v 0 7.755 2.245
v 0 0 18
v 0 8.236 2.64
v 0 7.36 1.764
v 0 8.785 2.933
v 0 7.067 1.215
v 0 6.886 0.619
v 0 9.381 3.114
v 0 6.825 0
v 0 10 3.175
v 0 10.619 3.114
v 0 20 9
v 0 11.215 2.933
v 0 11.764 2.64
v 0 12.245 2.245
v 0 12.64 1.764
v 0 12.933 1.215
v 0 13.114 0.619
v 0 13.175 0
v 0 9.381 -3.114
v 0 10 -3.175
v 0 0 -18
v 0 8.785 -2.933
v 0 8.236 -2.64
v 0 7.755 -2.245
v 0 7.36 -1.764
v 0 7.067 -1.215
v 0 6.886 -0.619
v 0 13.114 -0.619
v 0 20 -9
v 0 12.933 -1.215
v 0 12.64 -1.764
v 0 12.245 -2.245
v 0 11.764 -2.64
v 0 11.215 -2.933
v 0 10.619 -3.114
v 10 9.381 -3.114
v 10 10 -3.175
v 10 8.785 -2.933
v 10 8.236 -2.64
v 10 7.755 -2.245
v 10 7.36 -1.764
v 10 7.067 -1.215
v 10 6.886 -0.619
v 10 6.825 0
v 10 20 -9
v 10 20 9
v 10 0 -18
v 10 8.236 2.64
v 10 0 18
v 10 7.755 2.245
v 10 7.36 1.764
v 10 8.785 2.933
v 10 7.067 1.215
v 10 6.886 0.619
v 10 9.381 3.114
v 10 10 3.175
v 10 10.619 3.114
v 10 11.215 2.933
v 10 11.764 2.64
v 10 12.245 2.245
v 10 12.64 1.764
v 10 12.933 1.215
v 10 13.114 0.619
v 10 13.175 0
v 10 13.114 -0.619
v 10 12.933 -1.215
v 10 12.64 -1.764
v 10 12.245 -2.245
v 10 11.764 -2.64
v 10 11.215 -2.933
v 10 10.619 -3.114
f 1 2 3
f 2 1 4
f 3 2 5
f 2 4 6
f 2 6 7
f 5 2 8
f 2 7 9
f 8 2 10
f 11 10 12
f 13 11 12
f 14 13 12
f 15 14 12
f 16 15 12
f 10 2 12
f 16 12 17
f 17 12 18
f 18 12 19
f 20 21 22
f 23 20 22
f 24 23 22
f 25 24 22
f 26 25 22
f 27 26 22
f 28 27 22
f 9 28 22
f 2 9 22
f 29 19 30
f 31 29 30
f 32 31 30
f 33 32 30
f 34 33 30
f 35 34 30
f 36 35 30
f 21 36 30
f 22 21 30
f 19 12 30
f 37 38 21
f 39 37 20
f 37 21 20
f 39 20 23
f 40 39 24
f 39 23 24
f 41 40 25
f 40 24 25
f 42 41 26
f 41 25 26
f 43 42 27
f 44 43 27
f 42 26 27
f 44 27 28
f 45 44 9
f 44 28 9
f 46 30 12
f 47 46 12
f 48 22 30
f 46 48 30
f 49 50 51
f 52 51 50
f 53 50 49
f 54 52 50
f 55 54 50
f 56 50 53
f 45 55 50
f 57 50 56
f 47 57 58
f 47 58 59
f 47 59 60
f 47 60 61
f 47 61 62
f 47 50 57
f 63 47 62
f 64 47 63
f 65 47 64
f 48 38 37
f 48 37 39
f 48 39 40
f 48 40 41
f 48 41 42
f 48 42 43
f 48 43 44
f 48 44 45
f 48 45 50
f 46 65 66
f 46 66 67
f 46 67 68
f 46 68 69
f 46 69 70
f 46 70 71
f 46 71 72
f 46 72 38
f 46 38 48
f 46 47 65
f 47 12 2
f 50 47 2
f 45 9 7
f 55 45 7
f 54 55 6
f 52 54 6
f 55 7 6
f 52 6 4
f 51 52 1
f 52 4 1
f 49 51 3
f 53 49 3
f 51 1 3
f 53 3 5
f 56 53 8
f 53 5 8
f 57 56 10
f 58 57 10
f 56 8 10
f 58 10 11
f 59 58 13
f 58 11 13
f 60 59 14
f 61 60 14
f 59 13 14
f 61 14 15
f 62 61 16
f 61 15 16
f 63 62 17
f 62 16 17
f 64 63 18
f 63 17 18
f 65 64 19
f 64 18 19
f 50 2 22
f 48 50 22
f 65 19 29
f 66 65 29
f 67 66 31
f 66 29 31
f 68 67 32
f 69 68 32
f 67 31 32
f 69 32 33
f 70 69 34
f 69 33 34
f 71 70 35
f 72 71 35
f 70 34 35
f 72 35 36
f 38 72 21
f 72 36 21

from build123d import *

# Parameters (mm, degrees)
BOSS_EXTRUDE1_DEPTH = 10


with BuildPart() as part:
    # Sketch1 → Boss-Extrude1 (new body)
    with BuildSketch(Plane(origin=(0, 0, 0), x_dir=(0, 0, -1), z_dir=(1, 0, 0))):
        with BuildLine():
            Line((0, 6.825), (0, 0))
            Line((0, 0), (18, 0))
            Line((18, 0), (9, 20))
            Line((9, 20), (0, 20))
            Line((0, 20), (0, 13.175))
            ThreePointArc((0, 13.175), (2.24506403, 12.24506403), (3.175, 10))
            ThreePointArc((3.175, 10), (2.24506403, 7.75493597), (0, 6.825))
        make_face()
        with BuildLine():
            Line((-18, 0), (0, 0))
            Line((0, 0), (0, 6.825))
            ThreePointArc((0, 6.825), (-3.175, 10), (0, 13.175))
            Line((0, 13.175), (0, 20))
            Line((0, 20), (-9, 20))
            Line((-9, 20), (-18, 0))
        make_face()
    extrude(amount=BOSS_EXTRUDE1_DEPTH)


solid = part.part
